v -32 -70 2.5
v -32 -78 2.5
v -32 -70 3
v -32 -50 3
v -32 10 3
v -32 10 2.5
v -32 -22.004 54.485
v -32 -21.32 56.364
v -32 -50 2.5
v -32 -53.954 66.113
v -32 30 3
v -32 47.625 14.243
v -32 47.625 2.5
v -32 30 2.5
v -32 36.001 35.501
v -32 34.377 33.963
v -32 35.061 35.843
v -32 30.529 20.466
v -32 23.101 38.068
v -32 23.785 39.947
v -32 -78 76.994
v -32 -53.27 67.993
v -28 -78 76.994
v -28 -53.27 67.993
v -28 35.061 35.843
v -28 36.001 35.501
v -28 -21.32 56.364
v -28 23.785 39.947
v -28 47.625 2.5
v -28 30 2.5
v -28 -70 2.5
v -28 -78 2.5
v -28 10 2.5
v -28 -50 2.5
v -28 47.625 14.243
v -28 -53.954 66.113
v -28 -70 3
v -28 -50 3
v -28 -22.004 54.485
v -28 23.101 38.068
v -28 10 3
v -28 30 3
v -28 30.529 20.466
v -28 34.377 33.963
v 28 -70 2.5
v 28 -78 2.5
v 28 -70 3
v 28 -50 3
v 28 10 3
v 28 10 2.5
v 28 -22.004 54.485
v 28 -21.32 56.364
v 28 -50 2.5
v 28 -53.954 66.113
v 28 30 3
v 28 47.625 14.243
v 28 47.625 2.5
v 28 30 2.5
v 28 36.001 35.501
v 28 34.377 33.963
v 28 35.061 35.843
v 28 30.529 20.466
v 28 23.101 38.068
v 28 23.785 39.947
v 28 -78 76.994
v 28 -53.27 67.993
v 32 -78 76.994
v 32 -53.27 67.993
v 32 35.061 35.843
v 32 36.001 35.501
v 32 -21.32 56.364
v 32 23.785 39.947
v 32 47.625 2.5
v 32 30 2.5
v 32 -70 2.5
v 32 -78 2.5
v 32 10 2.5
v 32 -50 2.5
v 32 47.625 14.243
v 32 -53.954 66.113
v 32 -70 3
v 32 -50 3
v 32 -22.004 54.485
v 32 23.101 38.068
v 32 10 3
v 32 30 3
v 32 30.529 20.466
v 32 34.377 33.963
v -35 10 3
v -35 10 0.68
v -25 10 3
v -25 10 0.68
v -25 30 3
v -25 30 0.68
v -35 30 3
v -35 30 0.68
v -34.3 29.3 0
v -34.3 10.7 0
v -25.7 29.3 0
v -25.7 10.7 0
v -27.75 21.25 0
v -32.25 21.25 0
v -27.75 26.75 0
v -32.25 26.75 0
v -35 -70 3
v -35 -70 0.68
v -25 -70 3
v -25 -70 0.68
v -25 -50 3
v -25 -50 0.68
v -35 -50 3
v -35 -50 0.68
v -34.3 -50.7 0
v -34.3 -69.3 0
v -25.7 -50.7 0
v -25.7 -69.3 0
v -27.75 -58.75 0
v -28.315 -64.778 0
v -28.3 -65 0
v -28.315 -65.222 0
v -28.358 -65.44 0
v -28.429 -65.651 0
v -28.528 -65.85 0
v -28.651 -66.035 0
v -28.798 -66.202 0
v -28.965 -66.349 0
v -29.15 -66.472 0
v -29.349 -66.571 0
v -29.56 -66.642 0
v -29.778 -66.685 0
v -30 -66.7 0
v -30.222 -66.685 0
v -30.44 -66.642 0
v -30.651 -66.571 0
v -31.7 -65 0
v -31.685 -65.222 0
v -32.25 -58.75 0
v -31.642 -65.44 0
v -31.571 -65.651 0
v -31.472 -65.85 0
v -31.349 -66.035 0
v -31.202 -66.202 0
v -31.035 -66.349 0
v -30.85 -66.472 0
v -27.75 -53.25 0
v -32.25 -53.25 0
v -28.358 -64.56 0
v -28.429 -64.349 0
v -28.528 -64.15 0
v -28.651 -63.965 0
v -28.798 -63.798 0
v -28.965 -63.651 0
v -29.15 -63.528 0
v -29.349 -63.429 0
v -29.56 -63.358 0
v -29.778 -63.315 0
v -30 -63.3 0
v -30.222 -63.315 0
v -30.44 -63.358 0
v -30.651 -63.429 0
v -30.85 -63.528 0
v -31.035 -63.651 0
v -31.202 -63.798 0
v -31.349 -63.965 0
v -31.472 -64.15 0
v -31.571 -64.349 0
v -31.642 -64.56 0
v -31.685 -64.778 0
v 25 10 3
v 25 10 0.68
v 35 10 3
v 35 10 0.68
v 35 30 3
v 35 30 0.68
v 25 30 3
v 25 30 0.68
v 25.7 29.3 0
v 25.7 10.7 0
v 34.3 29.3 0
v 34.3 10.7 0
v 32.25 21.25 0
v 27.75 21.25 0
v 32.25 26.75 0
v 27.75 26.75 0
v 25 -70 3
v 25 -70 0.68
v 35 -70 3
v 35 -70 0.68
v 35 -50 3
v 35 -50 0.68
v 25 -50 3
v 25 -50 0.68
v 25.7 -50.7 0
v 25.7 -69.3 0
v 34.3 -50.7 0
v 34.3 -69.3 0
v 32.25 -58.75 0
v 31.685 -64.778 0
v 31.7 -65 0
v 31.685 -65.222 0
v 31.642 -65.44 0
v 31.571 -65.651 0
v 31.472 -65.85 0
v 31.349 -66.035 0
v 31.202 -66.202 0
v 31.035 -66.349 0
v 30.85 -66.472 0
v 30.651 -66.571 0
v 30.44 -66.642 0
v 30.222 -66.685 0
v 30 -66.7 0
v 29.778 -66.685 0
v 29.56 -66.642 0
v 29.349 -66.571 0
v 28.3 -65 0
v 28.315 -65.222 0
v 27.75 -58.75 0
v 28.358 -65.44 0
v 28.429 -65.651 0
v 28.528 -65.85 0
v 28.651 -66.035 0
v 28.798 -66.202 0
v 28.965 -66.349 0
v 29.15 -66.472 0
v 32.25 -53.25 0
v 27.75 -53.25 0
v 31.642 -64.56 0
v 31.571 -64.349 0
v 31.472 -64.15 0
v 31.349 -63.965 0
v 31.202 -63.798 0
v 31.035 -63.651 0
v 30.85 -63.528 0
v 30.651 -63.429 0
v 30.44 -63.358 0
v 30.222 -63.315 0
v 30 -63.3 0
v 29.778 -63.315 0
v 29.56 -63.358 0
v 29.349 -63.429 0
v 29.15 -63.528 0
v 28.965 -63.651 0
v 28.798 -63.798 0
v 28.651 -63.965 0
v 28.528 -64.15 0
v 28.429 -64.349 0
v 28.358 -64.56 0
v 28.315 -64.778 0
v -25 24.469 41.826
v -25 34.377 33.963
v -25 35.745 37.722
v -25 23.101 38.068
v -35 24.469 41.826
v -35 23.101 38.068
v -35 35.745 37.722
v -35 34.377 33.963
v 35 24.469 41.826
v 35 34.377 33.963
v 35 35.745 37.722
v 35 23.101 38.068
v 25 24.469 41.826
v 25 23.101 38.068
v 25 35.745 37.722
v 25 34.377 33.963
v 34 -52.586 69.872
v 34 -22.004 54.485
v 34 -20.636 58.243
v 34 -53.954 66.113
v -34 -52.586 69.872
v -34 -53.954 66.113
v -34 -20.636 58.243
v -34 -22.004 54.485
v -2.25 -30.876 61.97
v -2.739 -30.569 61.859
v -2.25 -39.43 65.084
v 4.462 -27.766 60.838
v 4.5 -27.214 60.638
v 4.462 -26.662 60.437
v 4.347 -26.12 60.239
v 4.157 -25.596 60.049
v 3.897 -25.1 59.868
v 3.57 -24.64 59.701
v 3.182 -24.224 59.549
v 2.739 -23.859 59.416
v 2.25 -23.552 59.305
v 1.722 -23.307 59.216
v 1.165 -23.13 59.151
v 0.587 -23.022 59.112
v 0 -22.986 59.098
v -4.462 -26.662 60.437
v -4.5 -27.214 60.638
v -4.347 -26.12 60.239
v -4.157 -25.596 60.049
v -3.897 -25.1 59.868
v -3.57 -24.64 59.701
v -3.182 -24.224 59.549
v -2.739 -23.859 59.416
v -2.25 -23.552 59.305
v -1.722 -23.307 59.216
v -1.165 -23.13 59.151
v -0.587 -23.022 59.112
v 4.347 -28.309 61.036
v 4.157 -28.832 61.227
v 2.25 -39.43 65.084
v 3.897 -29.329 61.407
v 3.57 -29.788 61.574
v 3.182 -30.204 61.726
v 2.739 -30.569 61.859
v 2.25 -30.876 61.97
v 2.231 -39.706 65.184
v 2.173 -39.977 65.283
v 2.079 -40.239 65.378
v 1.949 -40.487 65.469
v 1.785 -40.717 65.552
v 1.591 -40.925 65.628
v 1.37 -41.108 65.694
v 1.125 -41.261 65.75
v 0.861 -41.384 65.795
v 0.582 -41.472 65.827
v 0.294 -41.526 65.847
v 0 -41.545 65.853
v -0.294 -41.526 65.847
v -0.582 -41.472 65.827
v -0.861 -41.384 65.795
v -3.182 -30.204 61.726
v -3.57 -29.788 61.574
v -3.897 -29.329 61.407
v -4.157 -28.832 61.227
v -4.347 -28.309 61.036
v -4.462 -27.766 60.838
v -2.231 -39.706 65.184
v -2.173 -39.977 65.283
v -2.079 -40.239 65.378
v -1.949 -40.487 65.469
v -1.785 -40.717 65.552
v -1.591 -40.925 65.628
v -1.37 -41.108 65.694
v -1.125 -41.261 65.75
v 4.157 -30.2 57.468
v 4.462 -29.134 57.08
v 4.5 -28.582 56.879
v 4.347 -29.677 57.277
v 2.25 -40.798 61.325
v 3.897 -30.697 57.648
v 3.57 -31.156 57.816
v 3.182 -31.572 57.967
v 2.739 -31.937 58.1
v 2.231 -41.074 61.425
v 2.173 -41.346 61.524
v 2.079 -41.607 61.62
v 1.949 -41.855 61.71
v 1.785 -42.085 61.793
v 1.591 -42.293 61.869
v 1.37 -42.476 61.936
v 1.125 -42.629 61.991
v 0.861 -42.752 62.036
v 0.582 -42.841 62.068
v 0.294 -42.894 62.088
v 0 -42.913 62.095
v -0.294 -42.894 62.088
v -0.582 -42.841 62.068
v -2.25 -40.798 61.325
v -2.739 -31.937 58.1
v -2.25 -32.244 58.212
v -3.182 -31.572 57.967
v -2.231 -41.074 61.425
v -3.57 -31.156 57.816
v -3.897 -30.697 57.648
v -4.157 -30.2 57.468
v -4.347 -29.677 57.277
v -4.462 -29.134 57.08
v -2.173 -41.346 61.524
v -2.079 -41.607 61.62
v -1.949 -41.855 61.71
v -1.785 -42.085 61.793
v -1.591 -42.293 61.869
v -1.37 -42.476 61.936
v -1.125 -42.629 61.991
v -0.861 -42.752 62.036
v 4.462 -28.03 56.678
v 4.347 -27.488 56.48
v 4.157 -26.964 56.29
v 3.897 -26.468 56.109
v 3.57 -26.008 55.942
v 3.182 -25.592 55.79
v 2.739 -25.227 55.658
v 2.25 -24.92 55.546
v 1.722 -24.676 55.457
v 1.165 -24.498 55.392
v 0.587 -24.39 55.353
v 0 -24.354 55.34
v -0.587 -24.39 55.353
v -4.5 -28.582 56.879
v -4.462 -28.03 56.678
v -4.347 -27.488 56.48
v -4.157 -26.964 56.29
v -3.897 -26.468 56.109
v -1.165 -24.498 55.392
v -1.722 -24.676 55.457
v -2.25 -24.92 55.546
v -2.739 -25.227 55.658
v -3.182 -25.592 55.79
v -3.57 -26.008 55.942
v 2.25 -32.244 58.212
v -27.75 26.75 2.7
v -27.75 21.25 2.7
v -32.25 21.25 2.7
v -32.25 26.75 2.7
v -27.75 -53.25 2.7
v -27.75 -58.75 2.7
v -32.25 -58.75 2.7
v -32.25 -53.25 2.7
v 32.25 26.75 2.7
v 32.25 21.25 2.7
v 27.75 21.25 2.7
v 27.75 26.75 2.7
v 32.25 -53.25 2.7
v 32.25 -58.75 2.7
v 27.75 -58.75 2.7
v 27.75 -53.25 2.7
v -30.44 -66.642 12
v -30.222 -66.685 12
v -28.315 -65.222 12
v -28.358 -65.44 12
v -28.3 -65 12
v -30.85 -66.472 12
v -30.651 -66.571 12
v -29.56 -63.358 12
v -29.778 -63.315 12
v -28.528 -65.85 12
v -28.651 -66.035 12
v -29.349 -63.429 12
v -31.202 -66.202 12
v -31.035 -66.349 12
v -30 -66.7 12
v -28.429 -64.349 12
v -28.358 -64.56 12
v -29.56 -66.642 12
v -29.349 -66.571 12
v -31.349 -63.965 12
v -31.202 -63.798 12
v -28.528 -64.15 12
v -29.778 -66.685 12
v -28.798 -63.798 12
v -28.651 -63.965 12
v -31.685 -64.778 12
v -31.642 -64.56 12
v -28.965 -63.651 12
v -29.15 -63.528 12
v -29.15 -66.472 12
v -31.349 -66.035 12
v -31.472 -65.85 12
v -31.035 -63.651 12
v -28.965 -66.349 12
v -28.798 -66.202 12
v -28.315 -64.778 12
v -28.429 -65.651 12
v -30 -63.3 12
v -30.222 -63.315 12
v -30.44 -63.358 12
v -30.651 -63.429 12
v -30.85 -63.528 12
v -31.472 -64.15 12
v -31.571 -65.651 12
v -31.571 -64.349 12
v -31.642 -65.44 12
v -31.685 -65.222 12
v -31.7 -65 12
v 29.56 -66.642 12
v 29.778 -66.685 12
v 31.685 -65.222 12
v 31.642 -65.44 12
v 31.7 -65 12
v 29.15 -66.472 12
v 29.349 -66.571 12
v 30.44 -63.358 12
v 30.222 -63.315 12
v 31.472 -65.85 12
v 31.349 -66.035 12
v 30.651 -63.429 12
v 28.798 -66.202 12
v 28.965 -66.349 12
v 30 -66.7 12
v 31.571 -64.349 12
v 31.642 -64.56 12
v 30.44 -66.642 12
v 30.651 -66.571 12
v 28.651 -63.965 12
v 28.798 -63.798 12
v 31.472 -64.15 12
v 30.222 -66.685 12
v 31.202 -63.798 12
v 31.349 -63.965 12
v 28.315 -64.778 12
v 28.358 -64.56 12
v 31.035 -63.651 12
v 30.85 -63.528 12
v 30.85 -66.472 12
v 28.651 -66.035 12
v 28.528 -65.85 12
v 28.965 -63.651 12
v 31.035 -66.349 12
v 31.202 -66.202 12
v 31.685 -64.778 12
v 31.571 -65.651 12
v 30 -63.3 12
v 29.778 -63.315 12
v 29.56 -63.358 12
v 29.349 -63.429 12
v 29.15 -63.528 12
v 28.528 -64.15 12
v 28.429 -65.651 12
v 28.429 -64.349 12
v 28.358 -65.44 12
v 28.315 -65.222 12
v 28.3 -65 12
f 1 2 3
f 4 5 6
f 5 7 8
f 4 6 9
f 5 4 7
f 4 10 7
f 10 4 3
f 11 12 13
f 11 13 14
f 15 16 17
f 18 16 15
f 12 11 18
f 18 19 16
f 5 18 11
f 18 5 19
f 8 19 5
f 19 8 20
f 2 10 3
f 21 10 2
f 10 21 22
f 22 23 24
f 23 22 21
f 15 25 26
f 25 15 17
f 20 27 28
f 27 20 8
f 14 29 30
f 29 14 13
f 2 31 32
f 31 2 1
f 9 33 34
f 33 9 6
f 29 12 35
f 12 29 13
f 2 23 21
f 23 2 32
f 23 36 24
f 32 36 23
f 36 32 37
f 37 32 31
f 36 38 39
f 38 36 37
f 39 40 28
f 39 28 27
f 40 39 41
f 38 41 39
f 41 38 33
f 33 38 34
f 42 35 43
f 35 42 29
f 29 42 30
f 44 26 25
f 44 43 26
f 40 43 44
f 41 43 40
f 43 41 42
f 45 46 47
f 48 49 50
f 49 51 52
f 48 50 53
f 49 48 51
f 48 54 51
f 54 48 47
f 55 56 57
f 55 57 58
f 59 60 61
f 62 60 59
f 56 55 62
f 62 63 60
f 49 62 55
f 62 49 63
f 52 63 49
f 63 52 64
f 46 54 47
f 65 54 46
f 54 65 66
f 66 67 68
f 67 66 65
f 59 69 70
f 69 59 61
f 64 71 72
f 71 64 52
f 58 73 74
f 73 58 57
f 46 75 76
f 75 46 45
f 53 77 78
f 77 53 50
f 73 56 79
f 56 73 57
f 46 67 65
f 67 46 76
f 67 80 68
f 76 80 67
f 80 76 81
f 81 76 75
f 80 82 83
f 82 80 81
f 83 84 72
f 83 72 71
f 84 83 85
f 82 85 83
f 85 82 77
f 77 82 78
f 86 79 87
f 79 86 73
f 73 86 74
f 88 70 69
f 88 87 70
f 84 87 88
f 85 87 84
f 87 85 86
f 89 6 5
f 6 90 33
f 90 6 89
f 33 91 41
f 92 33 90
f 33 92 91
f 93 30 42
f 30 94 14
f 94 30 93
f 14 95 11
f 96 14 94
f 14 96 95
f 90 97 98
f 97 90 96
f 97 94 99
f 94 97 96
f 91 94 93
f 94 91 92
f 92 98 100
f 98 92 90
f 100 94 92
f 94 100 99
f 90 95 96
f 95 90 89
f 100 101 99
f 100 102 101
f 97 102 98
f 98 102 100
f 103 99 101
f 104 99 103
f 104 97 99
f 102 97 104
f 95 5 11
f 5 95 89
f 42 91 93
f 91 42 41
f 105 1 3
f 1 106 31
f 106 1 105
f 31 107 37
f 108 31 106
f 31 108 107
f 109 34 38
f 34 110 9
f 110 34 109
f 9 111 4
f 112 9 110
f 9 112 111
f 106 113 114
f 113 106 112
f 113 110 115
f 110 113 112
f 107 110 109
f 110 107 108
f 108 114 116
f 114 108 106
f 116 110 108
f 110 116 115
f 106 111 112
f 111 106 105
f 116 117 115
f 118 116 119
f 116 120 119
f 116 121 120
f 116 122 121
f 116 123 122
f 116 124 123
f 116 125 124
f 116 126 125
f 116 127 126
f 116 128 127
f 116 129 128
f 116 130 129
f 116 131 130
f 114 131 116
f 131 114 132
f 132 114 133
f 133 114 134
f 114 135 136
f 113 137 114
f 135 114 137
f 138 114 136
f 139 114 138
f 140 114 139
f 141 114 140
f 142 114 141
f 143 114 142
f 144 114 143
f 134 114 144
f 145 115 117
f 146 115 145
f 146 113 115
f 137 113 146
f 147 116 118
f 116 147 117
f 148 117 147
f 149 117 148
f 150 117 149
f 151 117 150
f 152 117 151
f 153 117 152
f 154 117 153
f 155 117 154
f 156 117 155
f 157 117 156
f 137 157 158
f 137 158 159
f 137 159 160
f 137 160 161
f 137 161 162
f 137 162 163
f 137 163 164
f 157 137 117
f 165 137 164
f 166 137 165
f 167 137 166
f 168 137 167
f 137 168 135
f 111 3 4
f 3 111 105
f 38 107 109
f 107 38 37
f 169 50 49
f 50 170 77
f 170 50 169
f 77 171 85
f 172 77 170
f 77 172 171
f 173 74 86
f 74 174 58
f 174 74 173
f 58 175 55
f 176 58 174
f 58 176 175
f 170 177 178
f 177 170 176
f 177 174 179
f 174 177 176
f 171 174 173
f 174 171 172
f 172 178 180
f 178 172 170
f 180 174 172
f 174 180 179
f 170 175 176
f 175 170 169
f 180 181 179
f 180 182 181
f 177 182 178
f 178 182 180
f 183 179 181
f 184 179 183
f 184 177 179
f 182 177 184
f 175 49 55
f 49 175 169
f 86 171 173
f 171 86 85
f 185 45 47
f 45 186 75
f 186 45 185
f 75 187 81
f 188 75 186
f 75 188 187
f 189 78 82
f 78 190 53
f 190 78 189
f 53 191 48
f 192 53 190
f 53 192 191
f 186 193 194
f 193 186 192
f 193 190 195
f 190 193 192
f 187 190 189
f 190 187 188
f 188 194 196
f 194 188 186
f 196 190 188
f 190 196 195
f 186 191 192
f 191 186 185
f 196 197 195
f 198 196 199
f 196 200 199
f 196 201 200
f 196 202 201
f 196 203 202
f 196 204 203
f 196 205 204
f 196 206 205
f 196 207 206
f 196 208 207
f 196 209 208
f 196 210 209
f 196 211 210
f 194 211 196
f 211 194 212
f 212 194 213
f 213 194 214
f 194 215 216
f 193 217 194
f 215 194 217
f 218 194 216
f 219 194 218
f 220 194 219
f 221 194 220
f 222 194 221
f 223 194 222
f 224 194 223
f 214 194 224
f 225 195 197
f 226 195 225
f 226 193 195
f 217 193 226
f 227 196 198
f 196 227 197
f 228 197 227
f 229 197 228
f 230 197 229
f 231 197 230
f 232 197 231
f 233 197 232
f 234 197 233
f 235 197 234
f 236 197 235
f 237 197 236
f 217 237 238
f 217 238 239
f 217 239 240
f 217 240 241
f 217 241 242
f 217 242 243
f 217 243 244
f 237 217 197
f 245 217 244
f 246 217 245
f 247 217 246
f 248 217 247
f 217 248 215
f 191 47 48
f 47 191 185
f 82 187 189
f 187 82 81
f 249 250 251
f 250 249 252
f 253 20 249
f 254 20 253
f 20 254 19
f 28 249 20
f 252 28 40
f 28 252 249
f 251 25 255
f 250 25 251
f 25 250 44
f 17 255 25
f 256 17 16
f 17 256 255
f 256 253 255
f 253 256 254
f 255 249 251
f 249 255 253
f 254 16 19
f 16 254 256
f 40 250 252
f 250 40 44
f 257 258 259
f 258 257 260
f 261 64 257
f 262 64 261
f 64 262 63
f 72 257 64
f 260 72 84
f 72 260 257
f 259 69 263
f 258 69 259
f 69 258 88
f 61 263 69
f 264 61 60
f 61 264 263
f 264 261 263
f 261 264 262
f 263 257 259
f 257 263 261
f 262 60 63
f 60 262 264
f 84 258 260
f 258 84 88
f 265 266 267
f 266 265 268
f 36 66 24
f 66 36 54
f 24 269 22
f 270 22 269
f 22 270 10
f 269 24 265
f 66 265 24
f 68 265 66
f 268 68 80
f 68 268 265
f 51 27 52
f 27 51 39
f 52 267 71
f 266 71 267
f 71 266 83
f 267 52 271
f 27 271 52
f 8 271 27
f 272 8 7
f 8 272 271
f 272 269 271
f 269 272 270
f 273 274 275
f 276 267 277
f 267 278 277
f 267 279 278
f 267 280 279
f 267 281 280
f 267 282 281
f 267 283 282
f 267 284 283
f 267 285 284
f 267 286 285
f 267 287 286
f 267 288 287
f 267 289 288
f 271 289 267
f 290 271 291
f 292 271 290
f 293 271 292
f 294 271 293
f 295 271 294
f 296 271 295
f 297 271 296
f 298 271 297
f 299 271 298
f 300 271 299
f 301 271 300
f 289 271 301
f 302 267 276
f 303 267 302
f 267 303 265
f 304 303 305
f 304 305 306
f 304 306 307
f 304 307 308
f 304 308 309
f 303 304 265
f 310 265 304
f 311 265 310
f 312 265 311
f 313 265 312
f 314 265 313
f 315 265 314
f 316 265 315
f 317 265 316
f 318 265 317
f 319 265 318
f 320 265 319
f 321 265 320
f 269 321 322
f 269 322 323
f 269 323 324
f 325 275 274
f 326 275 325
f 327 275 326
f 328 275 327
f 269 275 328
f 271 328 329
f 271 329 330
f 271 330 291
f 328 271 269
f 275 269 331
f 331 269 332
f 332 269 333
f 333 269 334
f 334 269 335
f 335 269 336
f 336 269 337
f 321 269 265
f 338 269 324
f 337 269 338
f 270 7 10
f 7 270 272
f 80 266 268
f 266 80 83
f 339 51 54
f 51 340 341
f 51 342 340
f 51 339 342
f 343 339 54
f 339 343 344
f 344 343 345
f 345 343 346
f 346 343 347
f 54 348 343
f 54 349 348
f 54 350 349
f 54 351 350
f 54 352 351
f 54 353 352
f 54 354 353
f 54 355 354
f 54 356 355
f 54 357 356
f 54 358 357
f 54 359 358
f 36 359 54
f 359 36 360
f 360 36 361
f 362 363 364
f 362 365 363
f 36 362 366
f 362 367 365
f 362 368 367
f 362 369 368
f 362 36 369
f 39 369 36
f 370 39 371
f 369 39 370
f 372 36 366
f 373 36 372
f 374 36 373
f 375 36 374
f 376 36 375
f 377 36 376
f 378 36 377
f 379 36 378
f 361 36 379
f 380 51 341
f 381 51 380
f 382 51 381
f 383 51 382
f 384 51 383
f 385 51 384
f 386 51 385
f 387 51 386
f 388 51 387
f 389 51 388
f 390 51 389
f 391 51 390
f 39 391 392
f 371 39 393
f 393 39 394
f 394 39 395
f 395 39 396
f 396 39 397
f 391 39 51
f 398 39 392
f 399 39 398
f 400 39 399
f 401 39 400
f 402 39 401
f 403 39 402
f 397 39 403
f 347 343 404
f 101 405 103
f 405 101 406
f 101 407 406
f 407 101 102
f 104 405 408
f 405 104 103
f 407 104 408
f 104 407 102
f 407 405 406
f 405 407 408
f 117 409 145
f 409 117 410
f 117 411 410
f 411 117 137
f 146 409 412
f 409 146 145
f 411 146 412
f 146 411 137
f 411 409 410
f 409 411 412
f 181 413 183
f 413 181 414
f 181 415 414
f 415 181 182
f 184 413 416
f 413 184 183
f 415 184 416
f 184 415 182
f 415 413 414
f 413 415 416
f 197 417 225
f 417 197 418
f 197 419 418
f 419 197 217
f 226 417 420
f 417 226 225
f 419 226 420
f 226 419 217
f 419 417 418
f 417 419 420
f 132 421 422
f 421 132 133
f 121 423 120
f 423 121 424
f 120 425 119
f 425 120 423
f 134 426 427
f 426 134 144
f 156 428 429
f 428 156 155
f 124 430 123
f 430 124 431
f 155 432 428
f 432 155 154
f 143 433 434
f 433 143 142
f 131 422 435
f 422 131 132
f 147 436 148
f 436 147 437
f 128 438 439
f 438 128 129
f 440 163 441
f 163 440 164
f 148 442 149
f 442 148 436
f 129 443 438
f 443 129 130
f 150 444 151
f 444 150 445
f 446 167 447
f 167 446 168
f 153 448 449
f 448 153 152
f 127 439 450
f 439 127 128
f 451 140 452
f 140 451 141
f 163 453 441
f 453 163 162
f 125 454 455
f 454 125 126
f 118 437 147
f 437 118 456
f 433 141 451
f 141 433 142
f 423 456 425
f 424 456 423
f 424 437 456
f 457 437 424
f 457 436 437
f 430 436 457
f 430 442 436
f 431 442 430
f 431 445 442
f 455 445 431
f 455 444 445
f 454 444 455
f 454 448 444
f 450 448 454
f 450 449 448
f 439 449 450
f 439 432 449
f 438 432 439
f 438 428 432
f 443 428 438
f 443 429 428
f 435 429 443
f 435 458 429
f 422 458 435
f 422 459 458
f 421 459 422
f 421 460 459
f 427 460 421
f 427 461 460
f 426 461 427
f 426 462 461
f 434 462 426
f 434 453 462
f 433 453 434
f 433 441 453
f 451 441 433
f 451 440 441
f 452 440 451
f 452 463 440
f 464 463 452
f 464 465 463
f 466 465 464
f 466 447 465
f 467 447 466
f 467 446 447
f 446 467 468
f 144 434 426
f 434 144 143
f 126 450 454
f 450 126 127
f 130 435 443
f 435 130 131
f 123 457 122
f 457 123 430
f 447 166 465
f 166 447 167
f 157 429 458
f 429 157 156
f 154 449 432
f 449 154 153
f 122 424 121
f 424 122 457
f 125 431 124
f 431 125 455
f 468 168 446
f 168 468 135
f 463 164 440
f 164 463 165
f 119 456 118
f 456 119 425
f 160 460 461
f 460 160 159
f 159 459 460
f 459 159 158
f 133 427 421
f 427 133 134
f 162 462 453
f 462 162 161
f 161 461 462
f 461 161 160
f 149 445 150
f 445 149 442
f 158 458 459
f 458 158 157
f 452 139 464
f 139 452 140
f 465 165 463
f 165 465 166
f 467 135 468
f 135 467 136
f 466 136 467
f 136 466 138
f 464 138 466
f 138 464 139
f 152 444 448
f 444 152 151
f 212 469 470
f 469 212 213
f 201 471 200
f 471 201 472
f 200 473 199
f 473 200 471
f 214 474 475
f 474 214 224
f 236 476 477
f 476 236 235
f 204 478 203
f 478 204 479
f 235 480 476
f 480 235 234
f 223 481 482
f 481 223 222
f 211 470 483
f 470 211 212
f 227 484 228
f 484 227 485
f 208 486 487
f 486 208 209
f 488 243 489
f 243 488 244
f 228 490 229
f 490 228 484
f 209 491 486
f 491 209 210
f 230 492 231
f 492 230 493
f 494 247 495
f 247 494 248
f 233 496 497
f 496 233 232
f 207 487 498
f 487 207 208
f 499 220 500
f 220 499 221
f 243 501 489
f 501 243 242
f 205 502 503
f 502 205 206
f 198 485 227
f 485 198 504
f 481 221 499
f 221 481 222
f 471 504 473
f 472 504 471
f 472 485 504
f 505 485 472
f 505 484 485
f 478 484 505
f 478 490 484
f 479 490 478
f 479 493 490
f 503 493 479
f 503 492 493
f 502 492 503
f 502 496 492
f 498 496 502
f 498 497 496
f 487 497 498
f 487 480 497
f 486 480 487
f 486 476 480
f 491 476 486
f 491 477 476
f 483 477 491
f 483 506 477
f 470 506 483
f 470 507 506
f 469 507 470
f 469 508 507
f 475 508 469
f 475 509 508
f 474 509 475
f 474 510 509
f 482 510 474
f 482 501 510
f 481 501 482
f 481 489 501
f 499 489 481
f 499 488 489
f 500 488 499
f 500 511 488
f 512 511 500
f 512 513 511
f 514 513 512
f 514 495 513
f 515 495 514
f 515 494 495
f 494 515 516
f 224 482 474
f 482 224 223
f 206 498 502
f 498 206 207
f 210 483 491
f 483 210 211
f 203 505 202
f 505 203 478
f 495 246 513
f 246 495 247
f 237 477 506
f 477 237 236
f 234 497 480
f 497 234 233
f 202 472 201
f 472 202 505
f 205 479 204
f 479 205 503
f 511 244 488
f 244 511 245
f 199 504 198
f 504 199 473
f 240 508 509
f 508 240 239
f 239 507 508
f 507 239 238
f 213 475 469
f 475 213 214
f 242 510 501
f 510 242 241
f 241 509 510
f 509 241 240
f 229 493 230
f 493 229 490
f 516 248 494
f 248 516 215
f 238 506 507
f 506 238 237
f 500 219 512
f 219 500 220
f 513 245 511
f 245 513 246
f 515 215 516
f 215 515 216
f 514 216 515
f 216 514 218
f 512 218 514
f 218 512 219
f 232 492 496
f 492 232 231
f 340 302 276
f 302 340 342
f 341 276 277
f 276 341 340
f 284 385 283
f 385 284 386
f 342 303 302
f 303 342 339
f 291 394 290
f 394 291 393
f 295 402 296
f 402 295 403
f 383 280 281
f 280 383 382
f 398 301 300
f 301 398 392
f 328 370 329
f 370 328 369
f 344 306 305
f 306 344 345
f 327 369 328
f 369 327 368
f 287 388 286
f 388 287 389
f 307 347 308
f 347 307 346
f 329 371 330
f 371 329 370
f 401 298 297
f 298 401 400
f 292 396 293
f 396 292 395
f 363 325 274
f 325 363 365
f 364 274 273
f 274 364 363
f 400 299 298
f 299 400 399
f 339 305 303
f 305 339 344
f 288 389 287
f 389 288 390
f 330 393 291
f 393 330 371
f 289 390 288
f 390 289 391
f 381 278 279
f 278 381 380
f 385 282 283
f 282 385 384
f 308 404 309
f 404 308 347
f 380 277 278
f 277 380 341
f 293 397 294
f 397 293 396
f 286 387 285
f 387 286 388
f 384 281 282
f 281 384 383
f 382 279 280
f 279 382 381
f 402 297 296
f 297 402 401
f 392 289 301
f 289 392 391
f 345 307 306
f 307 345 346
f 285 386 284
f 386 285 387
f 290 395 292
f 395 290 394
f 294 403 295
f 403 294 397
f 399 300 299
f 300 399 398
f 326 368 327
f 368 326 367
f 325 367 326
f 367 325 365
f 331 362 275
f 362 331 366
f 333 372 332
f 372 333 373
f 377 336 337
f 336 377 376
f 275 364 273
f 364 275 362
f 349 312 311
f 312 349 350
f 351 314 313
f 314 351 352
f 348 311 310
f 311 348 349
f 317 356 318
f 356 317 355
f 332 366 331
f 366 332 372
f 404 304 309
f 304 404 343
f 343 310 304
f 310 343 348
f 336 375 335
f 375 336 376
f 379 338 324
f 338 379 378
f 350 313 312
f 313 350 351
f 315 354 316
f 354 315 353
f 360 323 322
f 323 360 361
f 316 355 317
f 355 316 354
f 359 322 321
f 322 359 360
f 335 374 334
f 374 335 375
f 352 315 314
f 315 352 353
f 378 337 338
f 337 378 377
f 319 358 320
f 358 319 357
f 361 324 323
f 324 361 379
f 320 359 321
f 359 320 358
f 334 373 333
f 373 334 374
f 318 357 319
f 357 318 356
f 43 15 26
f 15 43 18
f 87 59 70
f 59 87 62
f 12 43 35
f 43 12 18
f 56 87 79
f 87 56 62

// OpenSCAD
// DIY ESP32 Alarm / Photo-Detector Enclosure
// Parametric OpenSCAD source, dimensions in mm.
// Designed for 0.4 mm nozzle / 0.2 mm layers, PLA or PETG.
$fn = 48;

PART = "wall_mount"; // front, rear, wall_mount, pcb2, assembly, wall_assembly, exploded
// Camera stays on the ESP32-S3-CAM board, facing -Y (USB connectors downward).
// No independent camera tilt: the original short ribbon stays in its natural position.
// The front cover must not pull, clamp or carry the camera when removed.
// Use the board's existing camera retention; this cover does not retain a loose sensor.
// Photo-based optical alignment is provisional: check against the real board before printing.

// ---------------- User-tunable parameters ----------------
case_w = 74;
case_d = 44;
case_h = 190;
corner_r = 11;
wall = 2.4;
// Shared rail dimensions: the rear rim follows the front edge of the rails.
pcb_rail_y = 9.5;
pcb_rail_depth = 25;
seam_y = min(0, pcb_rail_y - pcb_rail_depth/2); // -3 mm; rear half depth = 25 mm

// PCB reference matches the existing 60 mm rail channels, not a measured board.
pcb_reference_w = 28;              // existing project value
pcb_reference_h = 60;              // provisional occupied channel height
pcb_reference_z = -3;
pcb_slot_y_offset = -8.5;
pcb_reference_y = pcb_rail_y + pcb_slot_y_offset;

// Lens is over the upper portion of the PCB, as in the supplied photograph.
// Estimated offset; change this value if the lens is higher/lower on your board.
camera_from_pcb_top = 14;
camera_x = 0;
camera_z = pcb_reference_z + pcb_reference_h/2 - camera_from_pcb_top;
// Broad, shallow window tolerates alignment uncertainty and lens setback.
// Actual field of view still depends on the lens; no optical specification is assumed.
camera_window_w = 40;
camera_window_h = 40;
camera_window_r = 4;
show_electronics = true;            // assembly preview only, never exported to STL
camera_preview_projection = 7;    // illustrative projection from PCB, not measured

// ---------------- Fixed downward wall mount ----------------
wall_tilt = 20;                   // degrees downward; change and reprint (10..35)
screw_above_frame = 85;           // measured vertical screw-to-frame-top distance
door_vertical_clearance = 85;     // frame top to door collision limit
door_safety_clearance = 5;        // minimum reserved vertical gap above that limit
frame_projection = 14;            // ASSUMED protrusion from wall; user described frame width
frame_clearance = 4;              // allowance around the frame
// Conservative bound keeps the complete case clear of the frame below the screw.
wall_bottom_clearance = (frame_projection+frame_clearance)/cos(wall_tilt)+1;
mount_rib_x = 30;
mount_rib_t = 4;
mount_z_max = 78;
mount_plate_t = 4;
mount_screw_shank_d = 4.5;         // clearance for a nominal 4 mm wall screw
mount_screw_head_d = 9;            // entry clearance; head must be wider than shank slot
mount_head_space = 4;             // free depth behind retaining plate
wall_plane_y = case_d/2 + case_h/2*tan(wall_tilt) + wall_bottom_clearance;
// Position screw seat from the conservative bounding box of the tilted case.
// This automatically raises the case enough to clear the door with margin.
case_bottom_below_wall_origin = case_h/2*cos(wall_tilt)
    + case_d/2*sin(wall_tilt) + wall_plane_y*sin(wall_tilt);
mount_seat_z = screw_above_frame + door_vertical_clearance
    - door_safety_clearance - case_bottom_below_wall_origin;
mount_entry_z = mount_seat_z-13;   // entry below seat; lower case to lock
mount_plate_z = mount_seat_z-3;
frame_top_z = mount_seat_z-screw_above_frame; // wall-frame coordinates
mount_pad_h = 12;
mount_pad_z = frame_top_z+frame_clearance+mount_pad_h/2+1;
mount_z_min = (mount_pad_z-8)*cos(wall_tilt)-10;

// Wall plane in enclosure coordinates: y = wall_plane_y + z*tan(wall_tilt).
// Thick end at TOP: rotation +wall_tilt about X points the camera DOWN.

// Mounting: insert screw head in the LOWER round opening, then lower the case.
// Start with about 4.5 mm between wall and underside of screw head; adjust to fit.
// The two lower pads may receive thin non-slip pads of equal thickness.
// Mount prints separately; verify slicer support needs for the selected orientation.

// ---------------- Separate mount / PLA weld joints ----------------
joint_plane_y = case_d/2+4;        // mating plane; installed mount position unchanged
joint_zs = [-20,60];              // four pads: two per side
joint_w = 10;
joint_h = 20;
joint_bevel = 0.7;                // paired bevels form a perimeter welding groove
joint_clearance = 0.25;           // socket clearance per side
joint_pin_depth = 2.5;
joint_screw_d = 3.4;              // two optional M3 through-bolts, upper pads only
// Assemble dry: four rear pins into four blind mount sockets, faces seated.
// Tack opposite corners, then fill exposed perimeter grooves with matching PLA.
// Do not melt locating pins before alignment; allow the complete joint to cool.
// Optional upper through-bolts use nuts inside the empty rear shell.
// Select wall_mount for a separate part placed flat on its joint faces at Z=0.

m3_screw_clearance = 3.4;
m3_insert_pilot_d = 4.2;   // intentionally easy to tune for your actual heat-set insert
m3_boss_d = 9.5;
m3_z = -71;
m3_x = 20;

bay_w = 18;
bay_h = 10;
bay_cut_w_2pin = 5.50;
bay_cut_w_3pin = 8;
bay_cut_w_5pin = 16;
bay_cut_w_8pin = 21;
bay_cut_h = 3;
bay_z = -57;   // moved to lower rear section, above closure screws
bay_xs = [-22, 0, 22];
header_pitch = 2.54;
header_hole = 1.25;

// Vertical 5 V / GND bus supports on rear shell
bus_x = 29.0;             // buses are separated across almost the full enclosure width
bus_y = 15.7;             // wire center, behind PCB and clear of the shell seam
bus_z_min = -41;          // stops above Dupont connector zone
bus_z_max = 30;           // stops below camera mechanism
bus_wire_d = 1.6;         // tune for the copper wire / rod actually used
bus_wire_clearance = 0.45;
bus_clip_zs = [-38,-20,-2,16,28];

// Main 5 V USB power cable entry, centered at the bottom rear edge.
// Sized to pass a typical USB plug; tune to the actual cable before printing.
usb_entry_w = 16.0;
usb_entry_h = 10.0;
usb_entry_clearance = 0.8;
usb_entry_x = 0;
usb_entry_z = -92.0;
usb_strain_relief_z = -81.5;
usb_strain_relief_x = 7.5;
usb_zip_tie_slot_w = 3.2;
usb_zip_tie_slot_h = 7.0;

// ---------------- Utility geometry ----------------
module rounded_profile_2d(w,h,r) {
    offset(r=r) square([w-2*r,h-2*r],center=true);
}

module rounded_prism_y(w,d,h,r) {
    rotate([90,0,0]) linear_extrude(height=d,center=true,convexity=10) rounded_profile_2d(w,h,r);
}

module soft_body(w,d,h,r) {
    // Slightly softened/convex consumer-product profile with tapered front/rear edges.
    hull() {
        translate([0,-d/2+0.7,0]) rounded_prism_y(w-1.6,1.4,h-1.6,max(2,r-0.8));
        translate([0,-d/2+3.0,0]) rounded_prism_y(w,1.2,h,r);
        translate([0, d/2-3.0,0]) rounded_prism_y(w,1.2,h,r);
        translate([0, d/2-0.7,0]) rounded_prism_y(w-1.2,1.4,h-1.2,max(2,r-0.6));
    }
}

module hole_x(d=3, len=10) { rotate([0,90,0]) cylinder(d=d, h=len, center=true); }
module hole_y(d=3, len=10) { rotate([90,0,0]) cylinder(d=d, h=len, center=true); }

module shell_skin() {
    difference() {
        soft_body(case_w,case_d,case_h,corner_r);
        soft_body(case_w-2*wall, case_d-2*wall, case_h-2*wall, max(2,corner_r-wall));
    }
}

module front_skin() {
    intersection() {
        shell_skin();
        translate([0,(seam_y-case_d/2-2)/2,0])
            cube([case_w+4,seam_y+case_d/2+2,case_h+4],center=true);
    }
}

module rear_skin() {
    intersection() {
        shell_skin();
        translate([0,(seam_y+case_d/2+2)/2,0])
            cube([case_w+4,case_d/2+2-seam_y,case_h+4],center=true);
    }
}

// ---------------- Front shell internal mechanics ----------------
module camera_aperture_cut() {
    // Through the front wall only; no internal tunnel or separate camera cradle.
    translate([camera_x,-case_d/2+0.5,camera_z])
        rounded_prism_y(camera_window_w,2*wall+4,camera_window_h,camera_window_r);
}

module front_m3_bosses() {
    for (x=[-m3_x,m3_x])
        translate([x,-10.5,m3_z])
        difference() {
            rotate([90,0,0]) cylinder(d=m3_boss_d,h=20.4,center=true);
            // blind pilot from rear-facing end; leaves solid plastic toward front exterior
            translate([0,3.6,0]) rotate([90,0,0]) cylinder(d=m3_insert_pilot_d,h=14.8,center=true);
        }
}

module front_upper_hooks() {
    // Two real seam-crossing hooks. Front half extends through Y=seam_y into rear catch volume.
    for (x=[-20,20]) {
        union() {
            translate([x,seam_y-3.0,76]) cube([8,6,4],center=true);
            translate([x,seam_y+1.25,78.2]) cube([8,2.8,4.4],center=true); // barb across seam
            hull() {
                translate([x,-18.6,74]) cube([8,3.0,4],center=true);
                translate([x,seam_y-3.0,76]) cube([8,2,4],center=true);
            }
        }
    }
}

module front_shell() {
    difference() {
        union() {
            front_skin();
            front_m3_bosses();
            front_upper_hooks();
        }
        camera_aperture_cut();
    }
}

// ---------------- Rear shell mechanics ----------------
module rear_catches() {
    // Catch roof + side walls overlap the front hook barbs across the seam.
    for (x=[-20,20])
        difference() {
            union() {
                translate([x,seam_y+3.1,80.6]) cube([11,6.2,3.4],center=true);
                translate([x-4.8,seam_y+3.1,77.8]) cube([1.8,6.2,7.5],center=true);
                translate([x+4.8,seam_y+3.1,77.8]) cube([1.8,6.2,7.5],center=true);
            }
            translate([x,seam_y+1.2,78.1]) cube([9.4,4.0,4.8],center=true); // receiving pocket
        }
    // rear-wall bridges keep catches integral while leaving hook pocket open
    for (x=[-20,20]) hull() {
        translate([x,seam_y+5.5,82.0]) cube([8,2,2.4],center=true);
        translate([x,19.0,82.0]) cube([8,2.8,2.4],center=true);
    }
}

module rear_m3_pads() {
    for (x=[-m3_x,m3_x])
        translate([x,10.6,m3_z]) rotate([90,0,0]) cylinder(d=11.5,h=21.0,center=true);
}

module rear_m3_holes() {
    for (x=[-m3_x,m3_x]) {
        translate([x,10.5,m3_z]) rotate([90,0,0]) cylinder(d=m3_screw_clearance,h=25,center=true);
        // recessed screw head from rear face, not visible from front
        translate([x,19.0,m3_z]) rotate([90,0,0]) cylinder(d=6.7,h=7.0,center=true);
    }
}

// Local wall frame: X horizontal, Y toward wall, Z vertical when installed.
module wall_frame() {
    translate([0,wall_plane_y,0]) rotate([-wall_tilt,0,0]) children();
}

module wall_mount_rib(x) {
    // Side webs attach to rear skin and stop 2 mm short of the wall contact plane.
    translate([x-mount_rib_t/2,0,0])
        rotate([90,0,90]) linear_extrude(height=mount_rib_t)
            polygon(points=[
                [joint_plane_y+2.5,mount_z_min],
                [wall_plane_y+mount_z_min*tan(wall_tilt)-2/cos(wall_tilt),mount_z_min],
                [wall_plane_y+mount_z_max*tan(wall_tilt)-2/cos(wall_tilt),mount_z_max],
                [joint_plane_y+2.5,mount_z_max]
            ]);
}

// Bevel only exposed pad edges; broad central faces carry the mating load.
module joint_pad(rear=true) {
    if (rear) {
        translate([0,(case_d/2-1.5+joint_plane_y-joint_bevel)/2,0])
            cube([joint_w,joint_plane_y-joint_bevel-(case_d/2-1.5),joint_h],center=true);
        hull() {
            translate([0,joint_plane_y-joint_bevel+0.01,0])
                cube([joint_w,0.02,joint_h],center=true);
            translate([0,joint_plane_y-0.01,0])
                cube([joint_w-2*joint_bevel,0.02,joint_h-2*joint_bevel],center=true);
        }
    } else {
        hull() {
            translate([0,joint_plane_y+0.01,0])
                cube([joint_w-2*joint_bevel,0.02,joint_h-2*joint_bevel],center=true);
            translate([0,joint_plane_y+joint_bevel-0.01,0])
                cube([joint_w,0.02,joint_h],center=true);
        }
        translate([0,joint_plane_y+(joint_bevel+3)/2,0])
            cube([joint_w,3-joint_bevel,joint_h],center=true);
    }
}
module rear_joint_pads() {
    for (x=[-mount_rib_x,mount_rib_x]) for (z=joint_zs)
        translate([x,0,z]) {
            joint_pad(true);
            // Offset from optional screw; not a snap-fit or a substitute for welding.
            translate([0,joint_plane_y+joint_pin_depth/2-0.1,-4])
                cube([4,joint_pin_depth+0.2,5],center=true);
        }
}
module mount_joint_pads() {
    for (x=[-mount_rib_x,mount_rib_x]) for (z=joint_zs)
        translate([x,0,z]) joint_pad(false);
}
module joint_sockets() {
    for (x=[-mount_rib_x,mount_rib_x]) for (z=joint_zs)
        translate([x,joint_plane_y+(joint_pin_depth+0.2)/2-0.05,z-4])
            cube([4+2*joint_clearance,joint_pin_depth+0.3,5+2*joint_clearance],center=true);
}
module joint_bolt_holes() {
    for (x=[-mount_rib_x,mount_rib_x])
        translate([x,joint_plane_y,65]) hole_y(joint_screw_d,24);
}

module wall_mount() {
    difference() {
        union() {
            for (x=[-mount_rib_x,mount_rib_x]) wall_mount_rib(x);
            mount_joint_pads();
            wall_frame() {
                // Upper cross plate carries the single screw and joins both webs.
                translate([0,-mount_plate_t/2,mount_plate_z])
                    cube([68,mount_plate_t,34],center=true);
                // Two spaced lower contact pads stabilize pitch and sideways rocking.
                for (x=[-mount_rib_x,mount_rib_x])
                    translate([x,-mount_plate_t/2,mount_pad_z])
                        cube([10,mount_plate_t,mount_pad_h],center=true);
            }
        }
        joint_sockets();
        joint_bolt_holes();
        // Remove the frame envelope plus clearance from all mounting webs.
        // Treat everything below the frame top as occupied: no guessed frame height.
        wall_frame()
            translate([-case_w,-frame_projection-frame_clearance,
                       frame_top_z+frame_clearance-500])
                cube([2*case_w,frame_projection+frame_clearance+100,500]);
        wall_frame() {
            // Genuine gravity keyhole: large head-entry BELOW narrow shaft seat.
            translate([0,-mount_plate_t/2,mount_entry_z])
                hole_y(mount_screw_head_d,mount_plate_t+2);
            hull() {
                translate([0,-mount_plate_t/2,mount_entry_z])
                    hole_y(mount_screw_shank_d,mount_plate_t+2);
                translate([0,-mount_plate_t/2,mount_seat_z])
                    hole_y(mount_screw_shank_d,mount_plate_t+2);
            }
            // Clearance for the head behind the plate along its complete travel.
            hull() {
                for (z=[mount_entry_z,mount_seat_z])
                    translate([0,-mount_plate_t-mount_head_space/2-0.01,z])
                        hole_y(mount_screw_head_d,mount_head_space);
            }
        }
    }
}

module dupont_bay_cut(x=0,z=0, bay_cut_w) {
    translate([x,case_d/2-1.0,z]) cube([bay_cut_w,6,bay_cut_h],center=true);
}

module bus_clip(side=1,z=0) {
    // Open C-style clip for a vertical copper bus. The opening faces the enclosure center,
    // so the bus can be snapped in/out without threading it through closed holes.
    // The clip body bridges back to the rear wall and remains separate from PCB rails.
    x0 = side*bus_x;
    clip_w = 5.8;
    clip_d = 7.2;
    clip_h = 7.0;
    slot_w = bus_wire_d + bus_wire_clearance;
    difference() {
        hull() {
            translate([x0,bus_y,z]) cube([clip_w,clip_d,clip_h],center=true);
            translate([x0,19.0,z]) cube([clip_w,2.0,clip_h],center=true);
        }
        // Vertical bore for copper wire.
        translate([x0,bus_y,z]) cylinder(d=slot_w,h=clip_h+2,center=true);
        // Radial mouth opening toward the center of the enclosure.
        translate([x0-side*2.6,bus_y,z]) cube([4.6,slot_w+0.5,clip_h+2],center=true);
    }
}

module vertical_bus_supports() {
    for (side=[-1,1])
        for (z=bus_clip_zs) bus_clip(side,z);
}

module usb_power_entry_cut() {
    // Bottom-opening rounded rectangular cable feed-through in the REAR half only.
    // Opening to the bottom lets the cable be laid into the shell during service,
    // while the width/height still allow a typical USB plug to pass if required.
    translate([usb_entry_x, case_d/4 + 5.0, usb_entry_z])
        rounded_prism_y(usb_entry_w + usb_entry_clearance, case_d/2 + 8,
                        usb_entry_h + usb_entry_clearance, 2.2);
    // Extend the cut beyond the lower edge so it becomes a clean downward-facing notch.
    translate([usb_entry_x, case_d/4 + 5.0, -96.0])
        cube([usb_entry_w + usb_entry_clearance, case_d/2 + 8, 10], center=true);
}

module usb_strain_relief_bridges() {
    // Two internal zip-tie bridges. Cable runs vertically between them and the rear wall.
    // They are solidly bridged to the rear wall and do not project through the exterior.
    for (sx=[-1,1]) {
        x0 = sx*usb_strain_relief_x;
        difference() {
            hull() {
                translate([x0,15.5,usb_strain_relief_z]) cube([7.0,6.5,10.0],center=true);
                translate([x0,19.0,usb_strain_relief_z]) cube([7.0,2.0,10.0],center=true);
            }
            // Vertical slot for a small cable tie.
            translate([x0,15.2,usb_strain_relief_z])
                cube([usb_zip_tie_slot_w,8.5,usb_zip_tie_slot_h],center=true);
        }
    }
}

module pcb_rails() {
    // Removable ESP32 support: generous 31 mm rail spacing, open ends for serviceability.
    for (x=[-17,17])
        translate([x,14.5,-3]) difference() {
            cube([3.2,11.5,66],center=true);
            translate([x>0?-1.0:1.0,-2.0,0]) cube([2.0,6,60],center=true);
        }
    // small lower stop, leaving USB-C and microSD regions accessible from within when opened
    translate([0,15.0,-35]) cube([31,10.0,3],center=true);
}

module pcb_rails2() {

    // ============================================================
    // PCB DIMENSIONS
    // ============================================================

    // Real width of the ESP32 PCB.
    // The PCB is assumed to be centered on the X axis.
    pcb_width = 28;

    // Extra clearance so the PCB can slide into the rails
    // without being too tight after 3D printing.
    //
    // 0.4 mm total clearance = 0.2 mm on each side.
    pcb_clearance = 0.4;


    // ============================================================
    // RAIL X POSITION
    // ============================================================

    // X position of the center of each rail.
    //
    // PCB width:
    //
    //        -14 mm                  +14 mm
    //           |                       |
    //           |-------- PCB ----------|
    //
    // The slot inside each rail is shifted 1 mm toward the PCB.
    //
    // For a 28 mm PCB:
    //
    //     PCB half width       = 14.0 mm
    //     clearance per side   =  0.2 mm
    //     slot offset          =  1.0 mm
    //
    //     rail_x = 14.0 + 0.2 + 1.0
    //            = 15.2 mm
    //
    rail_x = (pcb_width + pcb_clearance) / 2 + 1;


    // ============================================================
    // RAIL Y POSITION
    // ============================================================

    // Shared with seam_y so the rear rim stays flush with the rails.
    rail_y = pcb_rail_y;


    // ============================================================
    // RAIL Z POSITION
    // ============================================================

    // Vertical position of the rail center.
    //
    // This is unchanged from the original design.
    rail_z = pcb_reference_z;


    // ============================================================
    // RAIL DIMENSIONS
    // ============================================================

    // Thickness of each rail in X.
    rail_width = 3.2;


    // Depth of each rail in Y.
    //
    // ORIGINAL = 20 mm
    // NEW      = 25 mm
    //
    // The additional 5 mm provides more structure around the
    // PCB + Dupont connector assembly.
    rail_depth = pcb_rail_depth;


    // Total vertical length of the rail.
    //
    // This has NOT been changed because the problem is not
    // the vertical PCB height, but the PCB + Dupont depth.
    rail_length = 66;


    // ============================================================
    // PCB SLOT DIMENSIONS
    // ============================================================

    // Width of the PCB slot in X.
    //
    // This should be slightly larger than the PCB thickness.
    slot_width = 2.0;


    // Depth of the PCB slot in Y.
    //
    // This determines how far the PCB edge enters the rail.
    slot_depth = 6;


    // Vertical length of the PCB slot.
    //
    // Slightly shorter than the complete rail so the rail
    // still has material at the upper and lower ends.
    slot_length = pcb_reference_h;


    // ============================================================
    // PCB SLOT X POSITION
    // ============================================================

    // Offset toward the center of the enclosure.
    //
    // RIGHT rail -> slot moves left
    // LEFT rail  -> slot moves right
    //
    slot_x_offset = 1.0;


    // ============================================================
    // PCB SLOT Y POSITION
    // ============================================================

    // Actual channel center: 9.5 - 8.5 = 1.0 mm in global Y.
    slot_y_offset = pcb_slot_y_offset;


    // ============================================================
    // CREATE LEFT AND RIGHT PCB RAILS
    // ============================================================

    // Generate two rails:
    //
    //     -rail_x = left rail
    //     +rail_x = right rail
    //
    for (x = [-rail_x, rail_x])

        // Move each rail to its final position.
        translate([
            x,
            rail_y,
            rail_z
        ])

            // Subtract the PCB slot from the solid rail.
            difference() {

                // =================================================
                // MAIN RAIL BODY
                // =================================================

                // Solid rail.
                //
                // X = rail thickness
                // Y = rail depth
                // Z = rail vertical length
                //
                cube(
                    [
                        rail_width,
                        rail_depth,
                        rail_length
                    ],
                    center = true
                );


                // =================================================
                // PCB SLOT
                // =================================================

                // Move the slot toward the PCB center.
                //
                // Right rail:
                //
                //     x > 0
                //     offset = -1 mm
                //
                // Left rail:
                //
                //     x < 0
                //     offset = +1 mm
                //
                translate([
                    x > 0
                        ? -slot_x_offset
                        :  slot_x_offset,

                    slot_y_offset,

                    0
                ])

                    // Material removed to create the PCB channel.
                    cube(
                        [
                            slot_width,
                            slot_depth,
                            slot_length
                        ],
                        center = true
                    );
            }


    // ============================================================
    // LOWER PCB STOP
    // ============================================================

    // Width of the lower PCB support.
    //
    // PCB = 28 mm
    //
    // 29 mm gives a small amount of support beyond both PCB edges.
    lower_stop_width = 29;


    // Depth of the lower stop.
    //
    // ORIGINAL = 10 mm
    // NEW      = 15 mm
    //
    // This also adds 5 mm toward the Dupont side, matching the
    // modification made to the main rails.
    //
    // Because its center also moves from 11.5 to 14 mm:
    //
    // ORIGINAL:
    //
    //     center = 11.5
    //     depth  = 10
    //     range  = 6.5 ... 16.5
    //
    // NEW:
    //
    //     center = 14
    //     depth  = 15
    //     range  = 6.5 ... 21.5
    //
    // So the original rear edge remains unchanged.
    lower_stop_depth = 15;


    // Thickness of the lower support in Z.
    lower_stop_height = 3;


    // Vertical position of the lower stop.
    //
    // This remains unchanged.
    lower_stop_z = -34.5;


    // ============================================================
    // CREATE LOWER PCB STOP
    // ============================================================

    // The lower stop prevents the ESP32 PCB from sliding downward.
    //
    // Its Y depth has also been extended to better support the
    // PCB + Dupont assembly.
    translate([
        0,
        rail_y,
        lower_stop_z
    ])

        cube(
            [
                lower_stop_width,
                lower_stop_depth,
                lower_stop_height
            ],
            center = true
        );
}

module buzzer_shelf() {
    // Optional SFM-27 shelf envelope ~30x15, held internally with zip-tie slots.
    translate([-20,13,36]) difference() {
        cube([34,15,3],center=true);
        for (x=[-11,11]) translate([x,0,0]) cube([3,16,4],center=true);
    }
}

module rear_shell() {
    difference() {
        union() {
            rear_skin();
            rear_joint_pads();
            rear_catches();
            rear_m3_pads();
            pcb_rails2();
            vertical_bus_supports();
            usb_strain_relief_bridges();
        }
        rear_m3_holes();
        joint_bolt_holes();
        usb_power_entry_cut();
        // Suspension is now in the external wedge, not through the rear skin.
        
        dupont_bay_cut(bay_xs[0],bay_z, bay_cut_w_2pin);
        dupont_bay_cut(bay_xs[1],bay_z, bay_cut_w_8pin);
        dupont_bay_cut(bay_xs[2],bay_z, bay_cut_w_3pin);
    }
}

// ---------------- Electronics reference (NOT printable geometry) ----------------
module electronics_reference() {
    // Illustrative envelope only: excludes pins, USB sockets and ribbon details.
    // Its dimensions follow the old rail assumptions, not a dimensional survey.
    color([0.1,0.45,0.2,0.8])
        translate([0,pcb_reference_y,pcb_reference_z])
            cube([pcb_reference_w,1.6,pcb_reference_h],center=true);
    color([0.15,0.15,0.15,1])
        translate([camera_x,pcb_reference_y-camera_preview_projection/2,camera_z])
            cube([9,camera_preview_projection,9],center=true);
    color([0.25,0.45,0.65,1])
        translate([camera_x,pcb_reference_y-camera_preview_projection,camera_z])
            hole_y(6,1);
}

// ---------------- Modular Dupont inserts ----------------
module snap_tab(zsign=1) {
    // Compliant tab with a small inward barb; use PETG if frequently swapped.
    z0=zsign*(bay_h/2-1.1);
    translate([0,-3.2,z0]) {
        cube([10,4.5,1.6],center=true);
        translate([0,-2.0,zsign*0.8]) cube([10,1.5,2.3],center=true);
    }
}



// ---------------- Assembly visualization ----------------
module assembly() {
    color([0.8,0.8,0.8,0.35]) front_shell();
    color("lightgray") rear_shell();
    color("steelblue") wall_mount();
    if ($preview && show_electronics) %electronics_reference();
}

// Installed view: screw seat at Z=0, wall Y=0, frame top Z=-85.
// Reference wall/frame are preview-only and excluded from exported meshes.
module installed_pose() {
    translate([0,-wall_plane_y*cos(wall_tilt),
               -wall_plane_y*sin(wall_tilt)-mount_seat_z])
        rotate([wall_tilt,0,0]) children();
}
module wall_assembly() {
    installed_pose() assembly();
    if ($preview) {
        %color([0.7,0.65,0.6,0.3])
            translate([0,2,-80]) cube([120,4,320],center=true);
        %color([0.65,0.35,0.15,0.6])
            translate([-60,-frame_projection,-screw_above_frame-150])
                cube([120,frame_projection,150]);
        %color("silver") translate([0,-4,0]) hole_y(mount_screw_shank_d-0.5,10);
        // Red reference plane: vertical collision limit supplied by the user.
        %color([1,0.15,0.1,0.25])
            translate([0,-55,-screw_above_frame-door_vertical_clearance])
                cube([120,120,0.6],center=true);
    }
}

module wall_mount_print() {
    translate([0,0,-joint_plane_y]) rotate([90,0,0]) wall_mount();
}
module exploded() {
    color("lightgray") rear_shell();
    color("steelblue") translate([0,25,0]) wall_mount();
    color("gainsboro") translate([0,-25,0]) front_shell();
}

// ---------------- Part selector ----------------
assert(door_vertical_clearance > door_safety_clearance && door_safety_clearance >= 5,
       "Reserve at least 5 mm of vertical door clearance");
assert(mount_seat_z > 0, "Door clearance requires a different mounting layout");
assert(screw_above_frame > 40, "Insufficient space above frame for this mount");
assert(frame_projection >= 0 && frame_clearance > 0, "Invalid frame clearance");
assert(wall_tilt >= 10 && wall_tilt <= 35, "Wall tilt must be 10..35 degrees downward");
assert(mount_screw_head_d > mount_screw_shank_d+2, "Insufficient screw head retention");
assert(camera_window_w < case_w-2*wall, "Camera window exceeds case width");
assert(abs(camera_z)+camera_window_h/2 < case_h/2-corner_r,
       "Camera window exceeds the straight front area");
if (PART=="front") front_shell();
else if (PART=="rear") rear_shell();
else if (PART=="wall_mount") wall_mount_print();
else if (PART=="exploded") exploded();
else if (PART=="pcb2") pcb_rails2();
else if (PART=="assembly") assembly();
else if (PART=="wall_assembly") wall_assembly();
else assert(false, "Use front, rear, wall_mount, pcb2, assembly, wall_assembly or exploded.");
